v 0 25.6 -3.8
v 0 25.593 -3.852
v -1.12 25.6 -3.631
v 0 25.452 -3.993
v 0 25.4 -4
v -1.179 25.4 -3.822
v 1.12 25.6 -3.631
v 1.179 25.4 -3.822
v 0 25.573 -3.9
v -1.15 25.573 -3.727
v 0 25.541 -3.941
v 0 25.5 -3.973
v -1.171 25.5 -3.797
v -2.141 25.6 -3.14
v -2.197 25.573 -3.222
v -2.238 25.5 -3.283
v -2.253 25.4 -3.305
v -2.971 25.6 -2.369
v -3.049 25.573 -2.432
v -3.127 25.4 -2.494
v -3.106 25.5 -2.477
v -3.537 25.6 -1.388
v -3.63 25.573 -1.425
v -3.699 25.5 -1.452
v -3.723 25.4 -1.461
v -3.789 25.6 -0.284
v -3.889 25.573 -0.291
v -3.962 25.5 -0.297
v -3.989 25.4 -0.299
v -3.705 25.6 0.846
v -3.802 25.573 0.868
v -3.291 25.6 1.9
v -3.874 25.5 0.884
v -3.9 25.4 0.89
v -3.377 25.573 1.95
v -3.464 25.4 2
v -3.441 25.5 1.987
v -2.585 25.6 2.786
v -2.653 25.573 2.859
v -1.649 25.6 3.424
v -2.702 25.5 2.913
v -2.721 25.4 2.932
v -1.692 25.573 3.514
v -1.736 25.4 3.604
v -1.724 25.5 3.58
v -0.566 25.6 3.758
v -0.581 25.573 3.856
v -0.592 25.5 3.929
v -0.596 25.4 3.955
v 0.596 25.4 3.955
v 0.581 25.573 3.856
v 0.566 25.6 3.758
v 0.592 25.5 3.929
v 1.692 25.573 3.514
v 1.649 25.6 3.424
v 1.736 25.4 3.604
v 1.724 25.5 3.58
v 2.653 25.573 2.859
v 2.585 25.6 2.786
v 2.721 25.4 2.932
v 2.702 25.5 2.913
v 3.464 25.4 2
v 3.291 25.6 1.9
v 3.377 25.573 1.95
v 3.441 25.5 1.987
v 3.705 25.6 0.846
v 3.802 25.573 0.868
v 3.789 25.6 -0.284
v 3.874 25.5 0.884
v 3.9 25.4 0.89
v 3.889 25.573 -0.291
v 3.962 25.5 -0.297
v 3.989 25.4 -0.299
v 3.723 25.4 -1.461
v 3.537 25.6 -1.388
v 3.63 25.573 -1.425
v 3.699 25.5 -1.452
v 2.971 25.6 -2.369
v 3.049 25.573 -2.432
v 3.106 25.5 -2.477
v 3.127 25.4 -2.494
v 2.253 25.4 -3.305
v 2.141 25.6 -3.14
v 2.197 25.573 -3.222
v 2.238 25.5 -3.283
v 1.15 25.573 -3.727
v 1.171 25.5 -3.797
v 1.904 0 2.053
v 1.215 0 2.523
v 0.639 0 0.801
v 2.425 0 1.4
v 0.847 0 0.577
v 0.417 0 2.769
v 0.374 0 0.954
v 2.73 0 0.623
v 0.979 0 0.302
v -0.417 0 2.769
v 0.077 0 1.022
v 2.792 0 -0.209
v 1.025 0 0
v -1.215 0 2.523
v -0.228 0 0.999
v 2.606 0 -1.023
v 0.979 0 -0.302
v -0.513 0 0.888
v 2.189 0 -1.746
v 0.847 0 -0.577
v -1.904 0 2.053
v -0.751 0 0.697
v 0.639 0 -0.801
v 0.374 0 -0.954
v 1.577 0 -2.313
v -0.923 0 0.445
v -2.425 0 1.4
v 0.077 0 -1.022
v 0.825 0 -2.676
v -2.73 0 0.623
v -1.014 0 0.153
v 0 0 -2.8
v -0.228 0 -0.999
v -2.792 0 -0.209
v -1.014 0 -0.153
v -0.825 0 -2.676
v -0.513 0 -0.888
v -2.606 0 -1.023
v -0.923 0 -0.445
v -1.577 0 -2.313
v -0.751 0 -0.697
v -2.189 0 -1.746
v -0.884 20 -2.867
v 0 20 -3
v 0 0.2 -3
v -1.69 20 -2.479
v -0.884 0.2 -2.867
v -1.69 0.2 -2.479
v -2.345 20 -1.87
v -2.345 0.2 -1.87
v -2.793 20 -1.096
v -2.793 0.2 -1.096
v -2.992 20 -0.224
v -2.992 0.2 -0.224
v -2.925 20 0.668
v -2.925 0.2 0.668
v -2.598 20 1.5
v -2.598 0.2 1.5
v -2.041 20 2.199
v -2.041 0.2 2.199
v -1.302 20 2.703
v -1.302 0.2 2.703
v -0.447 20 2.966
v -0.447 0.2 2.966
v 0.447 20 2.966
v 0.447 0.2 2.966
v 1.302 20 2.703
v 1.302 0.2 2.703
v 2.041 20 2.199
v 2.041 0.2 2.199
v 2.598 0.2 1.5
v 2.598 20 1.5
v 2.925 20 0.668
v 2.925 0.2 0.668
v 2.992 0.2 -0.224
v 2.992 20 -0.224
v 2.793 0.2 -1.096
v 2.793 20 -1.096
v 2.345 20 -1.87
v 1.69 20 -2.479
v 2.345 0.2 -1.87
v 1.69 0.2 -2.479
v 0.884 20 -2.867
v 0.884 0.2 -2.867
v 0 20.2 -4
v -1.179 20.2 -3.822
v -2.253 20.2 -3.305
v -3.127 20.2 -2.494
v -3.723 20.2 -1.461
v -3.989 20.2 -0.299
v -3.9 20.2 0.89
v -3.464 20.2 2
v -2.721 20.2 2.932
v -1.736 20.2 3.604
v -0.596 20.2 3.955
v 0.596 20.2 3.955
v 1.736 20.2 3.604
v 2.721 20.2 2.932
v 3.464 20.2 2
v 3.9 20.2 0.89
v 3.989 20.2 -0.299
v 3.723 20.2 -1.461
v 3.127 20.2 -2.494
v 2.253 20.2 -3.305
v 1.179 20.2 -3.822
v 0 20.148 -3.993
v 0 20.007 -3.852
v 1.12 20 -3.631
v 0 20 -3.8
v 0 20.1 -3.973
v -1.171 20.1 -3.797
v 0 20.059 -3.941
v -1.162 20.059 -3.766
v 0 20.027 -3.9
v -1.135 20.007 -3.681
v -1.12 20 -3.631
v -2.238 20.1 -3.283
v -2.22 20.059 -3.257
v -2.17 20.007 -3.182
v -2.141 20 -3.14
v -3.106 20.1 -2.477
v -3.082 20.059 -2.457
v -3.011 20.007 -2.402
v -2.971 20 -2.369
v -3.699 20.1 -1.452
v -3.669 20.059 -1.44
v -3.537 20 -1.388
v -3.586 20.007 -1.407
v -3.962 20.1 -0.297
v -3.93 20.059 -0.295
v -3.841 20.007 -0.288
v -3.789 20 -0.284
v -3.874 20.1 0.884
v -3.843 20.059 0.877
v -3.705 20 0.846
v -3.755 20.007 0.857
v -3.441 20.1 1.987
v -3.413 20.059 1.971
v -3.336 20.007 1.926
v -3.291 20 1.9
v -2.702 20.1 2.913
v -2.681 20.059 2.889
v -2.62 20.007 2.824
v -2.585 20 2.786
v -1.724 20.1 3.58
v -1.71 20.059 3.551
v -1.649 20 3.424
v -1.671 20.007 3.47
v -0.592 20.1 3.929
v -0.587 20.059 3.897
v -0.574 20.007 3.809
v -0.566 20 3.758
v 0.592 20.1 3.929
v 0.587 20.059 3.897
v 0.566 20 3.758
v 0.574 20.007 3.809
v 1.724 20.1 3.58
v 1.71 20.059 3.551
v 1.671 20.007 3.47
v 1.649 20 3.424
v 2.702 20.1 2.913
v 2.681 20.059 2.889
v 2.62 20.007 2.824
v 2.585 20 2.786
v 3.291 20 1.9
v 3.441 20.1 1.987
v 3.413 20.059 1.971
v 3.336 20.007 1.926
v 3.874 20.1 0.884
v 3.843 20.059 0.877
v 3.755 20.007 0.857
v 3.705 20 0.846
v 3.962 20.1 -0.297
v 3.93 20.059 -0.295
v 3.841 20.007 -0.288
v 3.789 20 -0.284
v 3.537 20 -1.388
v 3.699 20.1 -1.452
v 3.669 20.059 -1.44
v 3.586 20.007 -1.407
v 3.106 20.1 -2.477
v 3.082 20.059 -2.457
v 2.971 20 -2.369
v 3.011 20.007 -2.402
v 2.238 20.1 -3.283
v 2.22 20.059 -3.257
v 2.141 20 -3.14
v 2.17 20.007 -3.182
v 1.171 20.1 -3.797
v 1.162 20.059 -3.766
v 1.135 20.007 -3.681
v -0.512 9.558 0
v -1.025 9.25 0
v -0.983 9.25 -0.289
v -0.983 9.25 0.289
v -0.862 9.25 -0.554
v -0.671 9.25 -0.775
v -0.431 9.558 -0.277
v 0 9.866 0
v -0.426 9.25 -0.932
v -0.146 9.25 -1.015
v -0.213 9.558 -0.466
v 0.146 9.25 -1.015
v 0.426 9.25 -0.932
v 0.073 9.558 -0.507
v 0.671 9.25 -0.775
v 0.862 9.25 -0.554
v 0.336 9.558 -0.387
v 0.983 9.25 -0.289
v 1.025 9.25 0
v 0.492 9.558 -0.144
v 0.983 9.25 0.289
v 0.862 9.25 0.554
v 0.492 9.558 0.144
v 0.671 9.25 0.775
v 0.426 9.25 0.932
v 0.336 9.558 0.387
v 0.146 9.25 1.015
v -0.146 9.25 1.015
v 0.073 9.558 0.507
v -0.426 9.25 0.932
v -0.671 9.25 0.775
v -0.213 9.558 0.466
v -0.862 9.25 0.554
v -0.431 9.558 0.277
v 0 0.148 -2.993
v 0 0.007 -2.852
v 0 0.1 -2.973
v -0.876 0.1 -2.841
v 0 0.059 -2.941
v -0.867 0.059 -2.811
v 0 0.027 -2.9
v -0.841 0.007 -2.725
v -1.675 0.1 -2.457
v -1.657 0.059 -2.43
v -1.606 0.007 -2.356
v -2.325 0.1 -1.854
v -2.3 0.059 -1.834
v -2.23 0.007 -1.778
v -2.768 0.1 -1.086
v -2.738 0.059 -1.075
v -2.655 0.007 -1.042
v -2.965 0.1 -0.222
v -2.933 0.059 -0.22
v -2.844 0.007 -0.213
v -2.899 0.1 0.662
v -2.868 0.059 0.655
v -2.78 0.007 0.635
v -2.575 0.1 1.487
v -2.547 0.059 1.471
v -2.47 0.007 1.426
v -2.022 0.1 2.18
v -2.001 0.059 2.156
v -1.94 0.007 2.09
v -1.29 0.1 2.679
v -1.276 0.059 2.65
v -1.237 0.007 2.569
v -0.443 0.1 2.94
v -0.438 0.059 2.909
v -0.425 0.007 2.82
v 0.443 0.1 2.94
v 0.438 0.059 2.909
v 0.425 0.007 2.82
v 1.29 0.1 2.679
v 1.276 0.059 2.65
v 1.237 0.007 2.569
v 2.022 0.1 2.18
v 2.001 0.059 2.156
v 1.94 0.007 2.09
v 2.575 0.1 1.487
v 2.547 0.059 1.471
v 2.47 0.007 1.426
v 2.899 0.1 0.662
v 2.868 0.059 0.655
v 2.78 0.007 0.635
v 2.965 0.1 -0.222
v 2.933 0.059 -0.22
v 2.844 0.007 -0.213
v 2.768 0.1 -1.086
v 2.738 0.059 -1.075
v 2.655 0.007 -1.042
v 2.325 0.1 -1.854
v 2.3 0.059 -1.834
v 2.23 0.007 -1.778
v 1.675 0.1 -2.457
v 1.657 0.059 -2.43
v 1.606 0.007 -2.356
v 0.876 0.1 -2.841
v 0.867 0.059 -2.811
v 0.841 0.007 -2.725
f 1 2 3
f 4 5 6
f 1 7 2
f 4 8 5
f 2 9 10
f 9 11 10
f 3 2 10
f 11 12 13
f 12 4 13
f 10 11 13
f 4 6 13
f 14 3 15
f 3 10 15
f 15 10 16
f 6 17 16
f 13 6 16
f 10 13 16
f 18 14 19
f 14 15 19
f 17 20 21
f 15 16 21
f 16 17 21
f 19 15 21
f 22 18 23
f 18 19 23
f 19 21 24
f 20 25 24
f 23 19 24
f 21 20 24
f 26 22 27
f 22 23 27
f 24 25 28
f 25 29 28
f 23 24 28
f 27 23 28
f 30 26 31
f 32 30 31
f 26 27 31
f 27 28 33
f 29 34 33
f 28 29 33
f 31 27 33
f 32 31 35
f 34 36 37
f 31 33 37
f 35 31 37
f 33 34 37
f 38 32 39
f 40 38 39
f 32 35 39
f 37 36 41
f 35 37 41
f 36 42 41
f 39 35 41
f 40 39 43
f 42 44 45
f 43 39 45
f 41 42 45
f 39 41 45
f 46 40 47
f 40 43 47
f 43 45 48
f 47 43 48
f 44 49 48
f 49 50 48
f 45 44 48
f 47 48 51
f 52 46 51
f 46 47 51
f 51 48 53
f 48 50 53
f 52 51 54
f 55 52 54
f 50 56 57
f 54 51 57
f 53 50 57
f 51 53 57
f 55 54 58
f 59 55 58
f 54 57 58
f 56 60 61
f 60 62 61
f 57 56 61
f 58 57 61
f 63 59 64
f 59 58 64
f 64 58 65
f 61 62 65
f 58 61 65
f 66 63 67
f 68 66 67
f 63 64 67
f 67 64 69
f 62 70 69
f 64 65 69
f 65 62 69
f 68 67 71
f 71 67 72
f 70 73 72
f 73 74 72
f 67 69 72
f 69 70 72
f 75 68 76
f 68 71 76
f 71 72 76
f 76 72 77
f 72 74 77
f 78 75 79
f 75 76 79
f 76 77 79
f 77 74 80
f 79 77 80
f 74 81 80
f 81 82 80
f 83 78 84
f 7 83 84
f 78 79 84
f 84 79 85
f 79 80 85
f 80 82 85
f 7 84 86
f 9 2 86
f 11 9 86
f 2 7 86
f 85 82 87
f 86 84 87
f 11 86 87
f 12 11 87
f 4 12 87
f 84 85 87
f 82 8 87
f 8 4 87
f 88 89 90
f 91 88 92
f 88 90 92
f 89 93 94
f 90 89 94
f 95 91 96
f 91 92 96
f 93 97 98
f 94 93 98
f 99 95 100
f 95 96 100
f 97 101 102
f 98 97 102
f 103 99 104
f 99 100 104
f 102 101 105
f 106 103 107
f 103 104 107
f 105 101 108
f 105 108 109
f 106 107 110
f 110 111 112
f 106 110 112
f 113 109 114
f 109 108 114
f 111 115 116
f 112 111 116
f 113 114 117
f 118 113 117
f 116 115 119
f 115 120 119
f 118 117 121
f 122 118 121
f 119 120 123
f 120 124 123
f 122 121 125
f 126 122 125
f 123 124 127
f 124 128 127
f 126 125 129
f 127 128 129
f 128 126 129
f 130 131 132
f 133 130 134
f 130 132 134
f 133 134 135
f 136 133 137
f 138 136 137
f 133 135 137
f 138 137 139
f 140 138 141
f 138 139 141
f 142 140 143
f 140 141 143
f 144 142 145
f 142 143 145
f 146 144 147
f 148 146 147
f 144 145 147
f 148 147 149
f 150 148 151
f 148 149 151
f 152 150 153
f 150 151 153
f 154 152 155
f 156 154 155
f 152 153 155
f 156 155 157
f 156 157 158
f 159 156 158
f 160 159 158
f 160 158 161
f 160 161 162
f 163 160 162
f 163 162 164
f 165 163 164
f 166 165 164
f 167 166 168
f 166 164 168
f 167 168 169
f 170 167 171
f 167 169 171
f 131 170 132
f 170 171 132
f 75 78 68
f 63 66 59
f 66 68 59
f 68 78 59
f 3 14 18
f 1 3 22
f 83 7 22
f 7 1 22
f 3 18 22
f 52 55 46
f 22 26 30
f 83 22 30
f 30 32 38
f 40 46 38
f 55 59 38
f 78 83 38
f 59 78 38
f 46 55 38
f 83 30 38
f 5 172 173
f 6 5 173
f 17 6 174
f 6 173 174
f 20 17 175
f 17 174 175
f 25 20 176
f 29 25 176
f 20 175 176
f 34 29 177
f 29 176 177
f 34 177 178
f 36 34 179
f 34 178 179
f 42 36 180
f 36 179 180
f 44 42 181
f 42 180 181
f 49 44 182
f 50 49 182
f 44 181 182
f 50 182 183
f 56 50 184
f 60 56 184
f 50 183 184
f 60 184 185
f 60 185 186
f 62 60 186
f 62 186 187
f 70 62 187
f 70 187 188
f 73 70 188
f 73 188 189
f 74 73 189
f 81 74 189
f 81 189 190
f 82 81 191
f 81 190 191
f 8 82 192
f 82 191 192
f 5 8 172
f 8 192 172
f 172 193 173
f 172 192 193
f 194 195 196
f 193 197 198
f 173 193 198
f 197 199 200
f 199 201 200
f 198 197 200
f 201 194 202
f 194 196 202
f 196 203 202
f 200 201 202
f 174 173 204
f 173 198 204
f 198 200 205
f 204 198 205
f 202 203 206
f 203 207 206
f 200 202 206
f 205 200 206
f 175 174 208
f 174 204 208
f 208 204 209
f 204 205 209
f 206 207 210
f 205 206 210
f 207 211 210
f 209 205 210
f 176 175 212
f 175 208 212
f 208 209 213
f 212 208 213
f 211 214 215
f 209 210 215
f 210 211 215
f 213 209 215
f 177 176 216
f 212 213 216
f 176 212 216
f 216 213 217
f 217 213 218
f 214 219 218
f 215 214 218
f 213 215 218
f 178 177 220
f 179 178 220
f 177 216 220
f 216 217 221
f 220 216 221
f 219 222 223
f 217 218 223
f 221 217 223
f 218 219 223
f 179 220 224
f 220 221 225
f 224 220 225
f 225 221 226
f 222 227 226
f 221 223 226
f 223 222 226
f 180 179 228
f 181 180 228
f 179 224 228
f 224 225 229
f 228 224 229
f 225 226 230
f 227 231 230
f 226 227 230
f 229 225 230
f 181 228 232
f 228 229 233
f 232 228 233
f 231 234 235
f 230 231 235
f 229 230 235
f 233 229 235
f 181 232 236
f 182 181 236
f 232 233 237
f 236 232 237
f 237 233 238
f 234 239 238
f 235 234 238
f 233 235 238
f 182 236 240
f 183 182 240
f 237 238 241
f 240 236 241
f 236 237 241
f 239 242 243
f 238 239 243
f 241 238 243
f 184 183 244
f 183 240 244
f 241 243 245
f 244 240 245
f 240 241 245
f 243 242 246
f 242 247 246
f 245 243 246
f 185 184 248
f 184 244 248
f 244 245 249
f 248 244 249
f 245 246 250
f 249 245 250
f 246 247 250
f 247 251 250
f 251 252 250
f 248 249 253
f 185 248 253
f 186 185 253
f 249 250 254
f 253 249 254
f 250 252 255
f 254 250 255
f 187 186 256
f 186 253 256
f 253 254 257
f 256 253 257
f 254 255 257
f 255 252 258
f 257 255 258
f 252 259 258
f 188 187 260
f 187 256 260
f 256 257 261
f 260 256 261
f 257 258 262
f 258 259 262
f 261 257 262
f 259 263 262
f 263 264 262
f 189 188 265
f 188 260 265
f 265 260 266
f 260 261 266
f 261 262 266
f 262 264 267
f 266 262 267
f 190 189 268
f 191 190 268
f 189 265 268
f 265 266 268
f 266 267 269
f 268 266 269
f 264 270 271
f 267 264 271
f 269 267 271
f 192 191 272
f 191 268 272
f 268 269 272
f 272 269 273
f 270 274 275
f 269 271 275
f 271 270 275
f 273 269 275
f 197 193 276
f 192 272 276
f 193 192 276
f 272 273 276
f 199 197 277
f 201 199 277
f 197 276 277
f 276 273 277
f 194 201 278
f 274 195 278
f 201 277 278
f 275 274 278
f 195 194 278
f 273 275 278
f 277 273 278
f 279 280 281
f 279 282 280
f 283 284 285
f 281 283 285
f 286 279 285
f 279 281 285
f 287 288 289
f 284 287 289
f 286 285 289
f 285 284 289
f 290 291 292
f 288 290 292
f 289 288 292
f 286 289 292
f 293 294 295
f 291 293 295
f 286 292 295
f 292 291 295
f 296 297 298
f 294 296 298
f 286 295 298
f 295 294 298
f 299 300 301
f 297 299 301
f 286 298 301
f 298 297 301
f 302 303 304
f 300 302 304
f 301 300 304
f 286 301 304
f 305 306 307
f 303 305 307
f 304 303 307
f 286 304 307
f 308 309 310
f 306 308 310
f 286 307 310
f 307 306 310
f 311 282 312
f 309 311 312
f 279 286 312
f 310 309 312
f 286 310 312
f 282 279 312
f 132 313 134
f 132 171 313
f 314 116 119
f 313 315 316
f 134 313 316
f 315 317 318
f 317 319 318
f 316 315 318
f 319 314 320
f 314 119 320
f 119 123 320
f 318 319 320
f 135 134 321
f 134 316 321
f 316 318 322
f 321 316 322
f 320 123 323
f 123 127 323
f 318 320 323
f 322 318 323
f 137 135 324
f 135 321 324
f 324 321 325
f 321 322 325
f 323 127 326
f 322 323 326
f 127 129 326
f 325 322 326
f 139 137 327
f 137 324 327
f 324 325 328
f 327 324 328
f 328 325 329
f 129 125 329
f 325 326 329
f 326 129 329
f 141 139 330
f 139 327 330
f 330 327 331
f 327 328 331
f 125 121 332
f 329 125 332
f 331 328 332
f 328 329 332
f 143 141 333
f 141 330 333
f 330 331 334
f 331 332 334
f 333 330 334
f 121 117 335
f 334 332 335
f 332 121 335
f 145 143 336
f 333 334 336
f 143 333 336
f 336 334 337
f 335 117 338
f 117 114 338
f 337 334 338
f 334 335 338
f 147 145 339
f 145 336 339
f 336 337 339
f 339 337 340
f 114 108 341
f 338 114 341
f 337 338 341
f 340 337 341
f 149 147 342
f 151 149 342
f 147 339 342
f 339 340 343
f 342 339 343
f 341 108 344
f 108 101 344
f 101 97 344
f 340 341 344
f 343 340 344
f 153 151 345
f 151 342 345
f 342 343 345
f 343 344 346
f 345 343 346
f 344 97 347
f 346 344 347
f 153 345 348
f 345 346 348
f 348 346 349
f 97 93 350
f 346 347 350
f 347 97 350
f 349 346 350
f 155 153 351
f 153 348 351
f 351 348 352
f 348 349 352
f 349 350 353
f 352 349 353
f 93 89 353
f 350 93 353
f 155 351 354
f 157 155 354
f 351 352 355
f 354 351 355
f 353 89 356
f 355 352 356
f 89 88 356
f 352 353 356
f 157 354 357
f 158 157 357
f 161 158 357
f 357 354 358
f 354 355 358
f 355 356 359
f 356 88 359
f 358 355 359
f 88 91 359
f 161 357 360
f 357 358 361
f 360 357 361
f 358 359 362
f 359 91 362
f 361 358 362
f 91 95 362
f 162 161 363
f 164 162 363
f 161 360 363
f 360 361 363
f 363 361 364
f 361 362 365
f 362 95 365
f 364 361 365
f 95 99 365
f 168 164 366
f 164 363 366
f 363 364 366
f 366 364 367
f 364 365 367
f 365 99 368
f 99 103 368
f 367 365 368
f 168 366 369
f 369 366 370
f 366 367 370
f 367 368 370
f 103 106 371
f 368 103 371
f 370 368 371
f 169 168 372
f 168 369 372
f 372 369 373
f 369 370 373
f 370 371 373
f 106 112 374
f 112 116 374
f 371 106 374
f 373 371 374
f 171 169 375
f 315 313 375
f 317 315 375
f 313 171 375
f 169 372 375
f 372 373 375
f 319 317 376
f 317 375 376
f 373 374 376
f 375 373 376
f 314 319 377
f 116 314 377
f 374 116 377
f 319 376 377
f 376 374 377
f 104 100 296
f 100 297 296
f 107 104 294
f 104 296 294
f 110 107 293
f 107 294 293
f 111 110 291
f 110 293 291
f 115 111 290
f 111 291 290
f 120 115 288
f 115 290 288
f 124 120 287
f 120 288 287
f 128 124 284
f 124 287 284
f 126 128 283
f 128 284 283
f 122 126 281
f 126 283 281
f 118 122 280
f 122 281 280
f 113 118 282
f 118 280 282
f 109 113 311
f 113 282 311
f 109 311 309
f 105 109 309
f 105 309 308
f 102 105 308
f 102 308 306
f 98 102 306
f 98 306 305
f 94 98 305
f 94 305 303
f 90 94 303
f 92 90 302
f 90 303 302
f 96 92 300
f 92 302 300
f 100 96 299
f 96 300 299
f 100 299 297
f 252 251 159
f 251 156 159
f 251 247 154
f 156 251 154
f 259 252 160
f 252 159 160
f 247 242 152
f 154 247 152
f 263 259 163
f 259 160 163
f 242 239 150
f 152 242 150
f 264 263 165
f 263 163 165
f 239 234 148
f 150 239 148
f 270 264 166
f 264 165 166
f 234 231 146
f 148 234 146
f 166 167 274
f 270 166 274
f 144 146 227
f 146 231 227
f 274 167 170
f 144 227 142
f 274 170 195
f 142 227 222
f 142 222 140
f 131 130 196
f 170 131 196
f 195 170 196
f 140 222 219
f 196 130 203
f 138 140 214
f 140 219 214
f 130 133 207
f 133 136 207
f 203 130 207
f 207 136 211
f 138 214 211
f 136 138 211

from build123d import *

# Parameters (mm, degrees)
TROU_TARAUD_M2_51_D     = 2.05
TROU_TARAUD_M2_51_DEPTH = 9.25
TROU_TARAUD_M2_51_TIP   = 0.615882135
CONG_1_R                = 0.2


with BuildPart() as part:
    # Esquisse1 → Révolution1 (revolve)
    with BuildSketch(Plane.XY, mode=Mode.PRIVATE) as r_volution1_sk:
        Polygon((0, 25.6), (4, 25.6), (4, 20), (3, 20), (3, 0), (0, 0), align=None)
    revolve(r_volution1_sk.sketch.rotate(Axis((0, 0, 0), (0, 1, 0)), 90), axis=Axis((0, 0, 0), (0, 1, 0)))

    # Trou taraudé M2.51
    with Locations(Plane(origin=(0, 0, 0), x_dir=(-1, 0, 0), z_dir=(0, -1, 0))):
        with Locations((0, 0)):
            Hole(TROU_TARAUD_M2_51_D / 2, depth=TROU_TARAUD_M2_51_DEPTH)
            with Locations((0, 0, -(TROU_TARAUD_M2_51_DEPTH + TROU_TARAUD_M2_51_TIP / 2))):  # 118° drill point
                Cone(0, TROU_TARAUD_M2_51_D / 2, TROU_TARAUD_M2_51_TIP, mode=Mode.SUBTRACT)

    # Congé1
    cong_1_edges = [part.edges().sort_by_distance(p)[0] for p in [
        (0, 0, 3),
        (0, 20, 4),
        (0, 25.6, 4),
    ]]
    fillet(cong_1_edges, radius=CONG_1_R)


solid = part.part
